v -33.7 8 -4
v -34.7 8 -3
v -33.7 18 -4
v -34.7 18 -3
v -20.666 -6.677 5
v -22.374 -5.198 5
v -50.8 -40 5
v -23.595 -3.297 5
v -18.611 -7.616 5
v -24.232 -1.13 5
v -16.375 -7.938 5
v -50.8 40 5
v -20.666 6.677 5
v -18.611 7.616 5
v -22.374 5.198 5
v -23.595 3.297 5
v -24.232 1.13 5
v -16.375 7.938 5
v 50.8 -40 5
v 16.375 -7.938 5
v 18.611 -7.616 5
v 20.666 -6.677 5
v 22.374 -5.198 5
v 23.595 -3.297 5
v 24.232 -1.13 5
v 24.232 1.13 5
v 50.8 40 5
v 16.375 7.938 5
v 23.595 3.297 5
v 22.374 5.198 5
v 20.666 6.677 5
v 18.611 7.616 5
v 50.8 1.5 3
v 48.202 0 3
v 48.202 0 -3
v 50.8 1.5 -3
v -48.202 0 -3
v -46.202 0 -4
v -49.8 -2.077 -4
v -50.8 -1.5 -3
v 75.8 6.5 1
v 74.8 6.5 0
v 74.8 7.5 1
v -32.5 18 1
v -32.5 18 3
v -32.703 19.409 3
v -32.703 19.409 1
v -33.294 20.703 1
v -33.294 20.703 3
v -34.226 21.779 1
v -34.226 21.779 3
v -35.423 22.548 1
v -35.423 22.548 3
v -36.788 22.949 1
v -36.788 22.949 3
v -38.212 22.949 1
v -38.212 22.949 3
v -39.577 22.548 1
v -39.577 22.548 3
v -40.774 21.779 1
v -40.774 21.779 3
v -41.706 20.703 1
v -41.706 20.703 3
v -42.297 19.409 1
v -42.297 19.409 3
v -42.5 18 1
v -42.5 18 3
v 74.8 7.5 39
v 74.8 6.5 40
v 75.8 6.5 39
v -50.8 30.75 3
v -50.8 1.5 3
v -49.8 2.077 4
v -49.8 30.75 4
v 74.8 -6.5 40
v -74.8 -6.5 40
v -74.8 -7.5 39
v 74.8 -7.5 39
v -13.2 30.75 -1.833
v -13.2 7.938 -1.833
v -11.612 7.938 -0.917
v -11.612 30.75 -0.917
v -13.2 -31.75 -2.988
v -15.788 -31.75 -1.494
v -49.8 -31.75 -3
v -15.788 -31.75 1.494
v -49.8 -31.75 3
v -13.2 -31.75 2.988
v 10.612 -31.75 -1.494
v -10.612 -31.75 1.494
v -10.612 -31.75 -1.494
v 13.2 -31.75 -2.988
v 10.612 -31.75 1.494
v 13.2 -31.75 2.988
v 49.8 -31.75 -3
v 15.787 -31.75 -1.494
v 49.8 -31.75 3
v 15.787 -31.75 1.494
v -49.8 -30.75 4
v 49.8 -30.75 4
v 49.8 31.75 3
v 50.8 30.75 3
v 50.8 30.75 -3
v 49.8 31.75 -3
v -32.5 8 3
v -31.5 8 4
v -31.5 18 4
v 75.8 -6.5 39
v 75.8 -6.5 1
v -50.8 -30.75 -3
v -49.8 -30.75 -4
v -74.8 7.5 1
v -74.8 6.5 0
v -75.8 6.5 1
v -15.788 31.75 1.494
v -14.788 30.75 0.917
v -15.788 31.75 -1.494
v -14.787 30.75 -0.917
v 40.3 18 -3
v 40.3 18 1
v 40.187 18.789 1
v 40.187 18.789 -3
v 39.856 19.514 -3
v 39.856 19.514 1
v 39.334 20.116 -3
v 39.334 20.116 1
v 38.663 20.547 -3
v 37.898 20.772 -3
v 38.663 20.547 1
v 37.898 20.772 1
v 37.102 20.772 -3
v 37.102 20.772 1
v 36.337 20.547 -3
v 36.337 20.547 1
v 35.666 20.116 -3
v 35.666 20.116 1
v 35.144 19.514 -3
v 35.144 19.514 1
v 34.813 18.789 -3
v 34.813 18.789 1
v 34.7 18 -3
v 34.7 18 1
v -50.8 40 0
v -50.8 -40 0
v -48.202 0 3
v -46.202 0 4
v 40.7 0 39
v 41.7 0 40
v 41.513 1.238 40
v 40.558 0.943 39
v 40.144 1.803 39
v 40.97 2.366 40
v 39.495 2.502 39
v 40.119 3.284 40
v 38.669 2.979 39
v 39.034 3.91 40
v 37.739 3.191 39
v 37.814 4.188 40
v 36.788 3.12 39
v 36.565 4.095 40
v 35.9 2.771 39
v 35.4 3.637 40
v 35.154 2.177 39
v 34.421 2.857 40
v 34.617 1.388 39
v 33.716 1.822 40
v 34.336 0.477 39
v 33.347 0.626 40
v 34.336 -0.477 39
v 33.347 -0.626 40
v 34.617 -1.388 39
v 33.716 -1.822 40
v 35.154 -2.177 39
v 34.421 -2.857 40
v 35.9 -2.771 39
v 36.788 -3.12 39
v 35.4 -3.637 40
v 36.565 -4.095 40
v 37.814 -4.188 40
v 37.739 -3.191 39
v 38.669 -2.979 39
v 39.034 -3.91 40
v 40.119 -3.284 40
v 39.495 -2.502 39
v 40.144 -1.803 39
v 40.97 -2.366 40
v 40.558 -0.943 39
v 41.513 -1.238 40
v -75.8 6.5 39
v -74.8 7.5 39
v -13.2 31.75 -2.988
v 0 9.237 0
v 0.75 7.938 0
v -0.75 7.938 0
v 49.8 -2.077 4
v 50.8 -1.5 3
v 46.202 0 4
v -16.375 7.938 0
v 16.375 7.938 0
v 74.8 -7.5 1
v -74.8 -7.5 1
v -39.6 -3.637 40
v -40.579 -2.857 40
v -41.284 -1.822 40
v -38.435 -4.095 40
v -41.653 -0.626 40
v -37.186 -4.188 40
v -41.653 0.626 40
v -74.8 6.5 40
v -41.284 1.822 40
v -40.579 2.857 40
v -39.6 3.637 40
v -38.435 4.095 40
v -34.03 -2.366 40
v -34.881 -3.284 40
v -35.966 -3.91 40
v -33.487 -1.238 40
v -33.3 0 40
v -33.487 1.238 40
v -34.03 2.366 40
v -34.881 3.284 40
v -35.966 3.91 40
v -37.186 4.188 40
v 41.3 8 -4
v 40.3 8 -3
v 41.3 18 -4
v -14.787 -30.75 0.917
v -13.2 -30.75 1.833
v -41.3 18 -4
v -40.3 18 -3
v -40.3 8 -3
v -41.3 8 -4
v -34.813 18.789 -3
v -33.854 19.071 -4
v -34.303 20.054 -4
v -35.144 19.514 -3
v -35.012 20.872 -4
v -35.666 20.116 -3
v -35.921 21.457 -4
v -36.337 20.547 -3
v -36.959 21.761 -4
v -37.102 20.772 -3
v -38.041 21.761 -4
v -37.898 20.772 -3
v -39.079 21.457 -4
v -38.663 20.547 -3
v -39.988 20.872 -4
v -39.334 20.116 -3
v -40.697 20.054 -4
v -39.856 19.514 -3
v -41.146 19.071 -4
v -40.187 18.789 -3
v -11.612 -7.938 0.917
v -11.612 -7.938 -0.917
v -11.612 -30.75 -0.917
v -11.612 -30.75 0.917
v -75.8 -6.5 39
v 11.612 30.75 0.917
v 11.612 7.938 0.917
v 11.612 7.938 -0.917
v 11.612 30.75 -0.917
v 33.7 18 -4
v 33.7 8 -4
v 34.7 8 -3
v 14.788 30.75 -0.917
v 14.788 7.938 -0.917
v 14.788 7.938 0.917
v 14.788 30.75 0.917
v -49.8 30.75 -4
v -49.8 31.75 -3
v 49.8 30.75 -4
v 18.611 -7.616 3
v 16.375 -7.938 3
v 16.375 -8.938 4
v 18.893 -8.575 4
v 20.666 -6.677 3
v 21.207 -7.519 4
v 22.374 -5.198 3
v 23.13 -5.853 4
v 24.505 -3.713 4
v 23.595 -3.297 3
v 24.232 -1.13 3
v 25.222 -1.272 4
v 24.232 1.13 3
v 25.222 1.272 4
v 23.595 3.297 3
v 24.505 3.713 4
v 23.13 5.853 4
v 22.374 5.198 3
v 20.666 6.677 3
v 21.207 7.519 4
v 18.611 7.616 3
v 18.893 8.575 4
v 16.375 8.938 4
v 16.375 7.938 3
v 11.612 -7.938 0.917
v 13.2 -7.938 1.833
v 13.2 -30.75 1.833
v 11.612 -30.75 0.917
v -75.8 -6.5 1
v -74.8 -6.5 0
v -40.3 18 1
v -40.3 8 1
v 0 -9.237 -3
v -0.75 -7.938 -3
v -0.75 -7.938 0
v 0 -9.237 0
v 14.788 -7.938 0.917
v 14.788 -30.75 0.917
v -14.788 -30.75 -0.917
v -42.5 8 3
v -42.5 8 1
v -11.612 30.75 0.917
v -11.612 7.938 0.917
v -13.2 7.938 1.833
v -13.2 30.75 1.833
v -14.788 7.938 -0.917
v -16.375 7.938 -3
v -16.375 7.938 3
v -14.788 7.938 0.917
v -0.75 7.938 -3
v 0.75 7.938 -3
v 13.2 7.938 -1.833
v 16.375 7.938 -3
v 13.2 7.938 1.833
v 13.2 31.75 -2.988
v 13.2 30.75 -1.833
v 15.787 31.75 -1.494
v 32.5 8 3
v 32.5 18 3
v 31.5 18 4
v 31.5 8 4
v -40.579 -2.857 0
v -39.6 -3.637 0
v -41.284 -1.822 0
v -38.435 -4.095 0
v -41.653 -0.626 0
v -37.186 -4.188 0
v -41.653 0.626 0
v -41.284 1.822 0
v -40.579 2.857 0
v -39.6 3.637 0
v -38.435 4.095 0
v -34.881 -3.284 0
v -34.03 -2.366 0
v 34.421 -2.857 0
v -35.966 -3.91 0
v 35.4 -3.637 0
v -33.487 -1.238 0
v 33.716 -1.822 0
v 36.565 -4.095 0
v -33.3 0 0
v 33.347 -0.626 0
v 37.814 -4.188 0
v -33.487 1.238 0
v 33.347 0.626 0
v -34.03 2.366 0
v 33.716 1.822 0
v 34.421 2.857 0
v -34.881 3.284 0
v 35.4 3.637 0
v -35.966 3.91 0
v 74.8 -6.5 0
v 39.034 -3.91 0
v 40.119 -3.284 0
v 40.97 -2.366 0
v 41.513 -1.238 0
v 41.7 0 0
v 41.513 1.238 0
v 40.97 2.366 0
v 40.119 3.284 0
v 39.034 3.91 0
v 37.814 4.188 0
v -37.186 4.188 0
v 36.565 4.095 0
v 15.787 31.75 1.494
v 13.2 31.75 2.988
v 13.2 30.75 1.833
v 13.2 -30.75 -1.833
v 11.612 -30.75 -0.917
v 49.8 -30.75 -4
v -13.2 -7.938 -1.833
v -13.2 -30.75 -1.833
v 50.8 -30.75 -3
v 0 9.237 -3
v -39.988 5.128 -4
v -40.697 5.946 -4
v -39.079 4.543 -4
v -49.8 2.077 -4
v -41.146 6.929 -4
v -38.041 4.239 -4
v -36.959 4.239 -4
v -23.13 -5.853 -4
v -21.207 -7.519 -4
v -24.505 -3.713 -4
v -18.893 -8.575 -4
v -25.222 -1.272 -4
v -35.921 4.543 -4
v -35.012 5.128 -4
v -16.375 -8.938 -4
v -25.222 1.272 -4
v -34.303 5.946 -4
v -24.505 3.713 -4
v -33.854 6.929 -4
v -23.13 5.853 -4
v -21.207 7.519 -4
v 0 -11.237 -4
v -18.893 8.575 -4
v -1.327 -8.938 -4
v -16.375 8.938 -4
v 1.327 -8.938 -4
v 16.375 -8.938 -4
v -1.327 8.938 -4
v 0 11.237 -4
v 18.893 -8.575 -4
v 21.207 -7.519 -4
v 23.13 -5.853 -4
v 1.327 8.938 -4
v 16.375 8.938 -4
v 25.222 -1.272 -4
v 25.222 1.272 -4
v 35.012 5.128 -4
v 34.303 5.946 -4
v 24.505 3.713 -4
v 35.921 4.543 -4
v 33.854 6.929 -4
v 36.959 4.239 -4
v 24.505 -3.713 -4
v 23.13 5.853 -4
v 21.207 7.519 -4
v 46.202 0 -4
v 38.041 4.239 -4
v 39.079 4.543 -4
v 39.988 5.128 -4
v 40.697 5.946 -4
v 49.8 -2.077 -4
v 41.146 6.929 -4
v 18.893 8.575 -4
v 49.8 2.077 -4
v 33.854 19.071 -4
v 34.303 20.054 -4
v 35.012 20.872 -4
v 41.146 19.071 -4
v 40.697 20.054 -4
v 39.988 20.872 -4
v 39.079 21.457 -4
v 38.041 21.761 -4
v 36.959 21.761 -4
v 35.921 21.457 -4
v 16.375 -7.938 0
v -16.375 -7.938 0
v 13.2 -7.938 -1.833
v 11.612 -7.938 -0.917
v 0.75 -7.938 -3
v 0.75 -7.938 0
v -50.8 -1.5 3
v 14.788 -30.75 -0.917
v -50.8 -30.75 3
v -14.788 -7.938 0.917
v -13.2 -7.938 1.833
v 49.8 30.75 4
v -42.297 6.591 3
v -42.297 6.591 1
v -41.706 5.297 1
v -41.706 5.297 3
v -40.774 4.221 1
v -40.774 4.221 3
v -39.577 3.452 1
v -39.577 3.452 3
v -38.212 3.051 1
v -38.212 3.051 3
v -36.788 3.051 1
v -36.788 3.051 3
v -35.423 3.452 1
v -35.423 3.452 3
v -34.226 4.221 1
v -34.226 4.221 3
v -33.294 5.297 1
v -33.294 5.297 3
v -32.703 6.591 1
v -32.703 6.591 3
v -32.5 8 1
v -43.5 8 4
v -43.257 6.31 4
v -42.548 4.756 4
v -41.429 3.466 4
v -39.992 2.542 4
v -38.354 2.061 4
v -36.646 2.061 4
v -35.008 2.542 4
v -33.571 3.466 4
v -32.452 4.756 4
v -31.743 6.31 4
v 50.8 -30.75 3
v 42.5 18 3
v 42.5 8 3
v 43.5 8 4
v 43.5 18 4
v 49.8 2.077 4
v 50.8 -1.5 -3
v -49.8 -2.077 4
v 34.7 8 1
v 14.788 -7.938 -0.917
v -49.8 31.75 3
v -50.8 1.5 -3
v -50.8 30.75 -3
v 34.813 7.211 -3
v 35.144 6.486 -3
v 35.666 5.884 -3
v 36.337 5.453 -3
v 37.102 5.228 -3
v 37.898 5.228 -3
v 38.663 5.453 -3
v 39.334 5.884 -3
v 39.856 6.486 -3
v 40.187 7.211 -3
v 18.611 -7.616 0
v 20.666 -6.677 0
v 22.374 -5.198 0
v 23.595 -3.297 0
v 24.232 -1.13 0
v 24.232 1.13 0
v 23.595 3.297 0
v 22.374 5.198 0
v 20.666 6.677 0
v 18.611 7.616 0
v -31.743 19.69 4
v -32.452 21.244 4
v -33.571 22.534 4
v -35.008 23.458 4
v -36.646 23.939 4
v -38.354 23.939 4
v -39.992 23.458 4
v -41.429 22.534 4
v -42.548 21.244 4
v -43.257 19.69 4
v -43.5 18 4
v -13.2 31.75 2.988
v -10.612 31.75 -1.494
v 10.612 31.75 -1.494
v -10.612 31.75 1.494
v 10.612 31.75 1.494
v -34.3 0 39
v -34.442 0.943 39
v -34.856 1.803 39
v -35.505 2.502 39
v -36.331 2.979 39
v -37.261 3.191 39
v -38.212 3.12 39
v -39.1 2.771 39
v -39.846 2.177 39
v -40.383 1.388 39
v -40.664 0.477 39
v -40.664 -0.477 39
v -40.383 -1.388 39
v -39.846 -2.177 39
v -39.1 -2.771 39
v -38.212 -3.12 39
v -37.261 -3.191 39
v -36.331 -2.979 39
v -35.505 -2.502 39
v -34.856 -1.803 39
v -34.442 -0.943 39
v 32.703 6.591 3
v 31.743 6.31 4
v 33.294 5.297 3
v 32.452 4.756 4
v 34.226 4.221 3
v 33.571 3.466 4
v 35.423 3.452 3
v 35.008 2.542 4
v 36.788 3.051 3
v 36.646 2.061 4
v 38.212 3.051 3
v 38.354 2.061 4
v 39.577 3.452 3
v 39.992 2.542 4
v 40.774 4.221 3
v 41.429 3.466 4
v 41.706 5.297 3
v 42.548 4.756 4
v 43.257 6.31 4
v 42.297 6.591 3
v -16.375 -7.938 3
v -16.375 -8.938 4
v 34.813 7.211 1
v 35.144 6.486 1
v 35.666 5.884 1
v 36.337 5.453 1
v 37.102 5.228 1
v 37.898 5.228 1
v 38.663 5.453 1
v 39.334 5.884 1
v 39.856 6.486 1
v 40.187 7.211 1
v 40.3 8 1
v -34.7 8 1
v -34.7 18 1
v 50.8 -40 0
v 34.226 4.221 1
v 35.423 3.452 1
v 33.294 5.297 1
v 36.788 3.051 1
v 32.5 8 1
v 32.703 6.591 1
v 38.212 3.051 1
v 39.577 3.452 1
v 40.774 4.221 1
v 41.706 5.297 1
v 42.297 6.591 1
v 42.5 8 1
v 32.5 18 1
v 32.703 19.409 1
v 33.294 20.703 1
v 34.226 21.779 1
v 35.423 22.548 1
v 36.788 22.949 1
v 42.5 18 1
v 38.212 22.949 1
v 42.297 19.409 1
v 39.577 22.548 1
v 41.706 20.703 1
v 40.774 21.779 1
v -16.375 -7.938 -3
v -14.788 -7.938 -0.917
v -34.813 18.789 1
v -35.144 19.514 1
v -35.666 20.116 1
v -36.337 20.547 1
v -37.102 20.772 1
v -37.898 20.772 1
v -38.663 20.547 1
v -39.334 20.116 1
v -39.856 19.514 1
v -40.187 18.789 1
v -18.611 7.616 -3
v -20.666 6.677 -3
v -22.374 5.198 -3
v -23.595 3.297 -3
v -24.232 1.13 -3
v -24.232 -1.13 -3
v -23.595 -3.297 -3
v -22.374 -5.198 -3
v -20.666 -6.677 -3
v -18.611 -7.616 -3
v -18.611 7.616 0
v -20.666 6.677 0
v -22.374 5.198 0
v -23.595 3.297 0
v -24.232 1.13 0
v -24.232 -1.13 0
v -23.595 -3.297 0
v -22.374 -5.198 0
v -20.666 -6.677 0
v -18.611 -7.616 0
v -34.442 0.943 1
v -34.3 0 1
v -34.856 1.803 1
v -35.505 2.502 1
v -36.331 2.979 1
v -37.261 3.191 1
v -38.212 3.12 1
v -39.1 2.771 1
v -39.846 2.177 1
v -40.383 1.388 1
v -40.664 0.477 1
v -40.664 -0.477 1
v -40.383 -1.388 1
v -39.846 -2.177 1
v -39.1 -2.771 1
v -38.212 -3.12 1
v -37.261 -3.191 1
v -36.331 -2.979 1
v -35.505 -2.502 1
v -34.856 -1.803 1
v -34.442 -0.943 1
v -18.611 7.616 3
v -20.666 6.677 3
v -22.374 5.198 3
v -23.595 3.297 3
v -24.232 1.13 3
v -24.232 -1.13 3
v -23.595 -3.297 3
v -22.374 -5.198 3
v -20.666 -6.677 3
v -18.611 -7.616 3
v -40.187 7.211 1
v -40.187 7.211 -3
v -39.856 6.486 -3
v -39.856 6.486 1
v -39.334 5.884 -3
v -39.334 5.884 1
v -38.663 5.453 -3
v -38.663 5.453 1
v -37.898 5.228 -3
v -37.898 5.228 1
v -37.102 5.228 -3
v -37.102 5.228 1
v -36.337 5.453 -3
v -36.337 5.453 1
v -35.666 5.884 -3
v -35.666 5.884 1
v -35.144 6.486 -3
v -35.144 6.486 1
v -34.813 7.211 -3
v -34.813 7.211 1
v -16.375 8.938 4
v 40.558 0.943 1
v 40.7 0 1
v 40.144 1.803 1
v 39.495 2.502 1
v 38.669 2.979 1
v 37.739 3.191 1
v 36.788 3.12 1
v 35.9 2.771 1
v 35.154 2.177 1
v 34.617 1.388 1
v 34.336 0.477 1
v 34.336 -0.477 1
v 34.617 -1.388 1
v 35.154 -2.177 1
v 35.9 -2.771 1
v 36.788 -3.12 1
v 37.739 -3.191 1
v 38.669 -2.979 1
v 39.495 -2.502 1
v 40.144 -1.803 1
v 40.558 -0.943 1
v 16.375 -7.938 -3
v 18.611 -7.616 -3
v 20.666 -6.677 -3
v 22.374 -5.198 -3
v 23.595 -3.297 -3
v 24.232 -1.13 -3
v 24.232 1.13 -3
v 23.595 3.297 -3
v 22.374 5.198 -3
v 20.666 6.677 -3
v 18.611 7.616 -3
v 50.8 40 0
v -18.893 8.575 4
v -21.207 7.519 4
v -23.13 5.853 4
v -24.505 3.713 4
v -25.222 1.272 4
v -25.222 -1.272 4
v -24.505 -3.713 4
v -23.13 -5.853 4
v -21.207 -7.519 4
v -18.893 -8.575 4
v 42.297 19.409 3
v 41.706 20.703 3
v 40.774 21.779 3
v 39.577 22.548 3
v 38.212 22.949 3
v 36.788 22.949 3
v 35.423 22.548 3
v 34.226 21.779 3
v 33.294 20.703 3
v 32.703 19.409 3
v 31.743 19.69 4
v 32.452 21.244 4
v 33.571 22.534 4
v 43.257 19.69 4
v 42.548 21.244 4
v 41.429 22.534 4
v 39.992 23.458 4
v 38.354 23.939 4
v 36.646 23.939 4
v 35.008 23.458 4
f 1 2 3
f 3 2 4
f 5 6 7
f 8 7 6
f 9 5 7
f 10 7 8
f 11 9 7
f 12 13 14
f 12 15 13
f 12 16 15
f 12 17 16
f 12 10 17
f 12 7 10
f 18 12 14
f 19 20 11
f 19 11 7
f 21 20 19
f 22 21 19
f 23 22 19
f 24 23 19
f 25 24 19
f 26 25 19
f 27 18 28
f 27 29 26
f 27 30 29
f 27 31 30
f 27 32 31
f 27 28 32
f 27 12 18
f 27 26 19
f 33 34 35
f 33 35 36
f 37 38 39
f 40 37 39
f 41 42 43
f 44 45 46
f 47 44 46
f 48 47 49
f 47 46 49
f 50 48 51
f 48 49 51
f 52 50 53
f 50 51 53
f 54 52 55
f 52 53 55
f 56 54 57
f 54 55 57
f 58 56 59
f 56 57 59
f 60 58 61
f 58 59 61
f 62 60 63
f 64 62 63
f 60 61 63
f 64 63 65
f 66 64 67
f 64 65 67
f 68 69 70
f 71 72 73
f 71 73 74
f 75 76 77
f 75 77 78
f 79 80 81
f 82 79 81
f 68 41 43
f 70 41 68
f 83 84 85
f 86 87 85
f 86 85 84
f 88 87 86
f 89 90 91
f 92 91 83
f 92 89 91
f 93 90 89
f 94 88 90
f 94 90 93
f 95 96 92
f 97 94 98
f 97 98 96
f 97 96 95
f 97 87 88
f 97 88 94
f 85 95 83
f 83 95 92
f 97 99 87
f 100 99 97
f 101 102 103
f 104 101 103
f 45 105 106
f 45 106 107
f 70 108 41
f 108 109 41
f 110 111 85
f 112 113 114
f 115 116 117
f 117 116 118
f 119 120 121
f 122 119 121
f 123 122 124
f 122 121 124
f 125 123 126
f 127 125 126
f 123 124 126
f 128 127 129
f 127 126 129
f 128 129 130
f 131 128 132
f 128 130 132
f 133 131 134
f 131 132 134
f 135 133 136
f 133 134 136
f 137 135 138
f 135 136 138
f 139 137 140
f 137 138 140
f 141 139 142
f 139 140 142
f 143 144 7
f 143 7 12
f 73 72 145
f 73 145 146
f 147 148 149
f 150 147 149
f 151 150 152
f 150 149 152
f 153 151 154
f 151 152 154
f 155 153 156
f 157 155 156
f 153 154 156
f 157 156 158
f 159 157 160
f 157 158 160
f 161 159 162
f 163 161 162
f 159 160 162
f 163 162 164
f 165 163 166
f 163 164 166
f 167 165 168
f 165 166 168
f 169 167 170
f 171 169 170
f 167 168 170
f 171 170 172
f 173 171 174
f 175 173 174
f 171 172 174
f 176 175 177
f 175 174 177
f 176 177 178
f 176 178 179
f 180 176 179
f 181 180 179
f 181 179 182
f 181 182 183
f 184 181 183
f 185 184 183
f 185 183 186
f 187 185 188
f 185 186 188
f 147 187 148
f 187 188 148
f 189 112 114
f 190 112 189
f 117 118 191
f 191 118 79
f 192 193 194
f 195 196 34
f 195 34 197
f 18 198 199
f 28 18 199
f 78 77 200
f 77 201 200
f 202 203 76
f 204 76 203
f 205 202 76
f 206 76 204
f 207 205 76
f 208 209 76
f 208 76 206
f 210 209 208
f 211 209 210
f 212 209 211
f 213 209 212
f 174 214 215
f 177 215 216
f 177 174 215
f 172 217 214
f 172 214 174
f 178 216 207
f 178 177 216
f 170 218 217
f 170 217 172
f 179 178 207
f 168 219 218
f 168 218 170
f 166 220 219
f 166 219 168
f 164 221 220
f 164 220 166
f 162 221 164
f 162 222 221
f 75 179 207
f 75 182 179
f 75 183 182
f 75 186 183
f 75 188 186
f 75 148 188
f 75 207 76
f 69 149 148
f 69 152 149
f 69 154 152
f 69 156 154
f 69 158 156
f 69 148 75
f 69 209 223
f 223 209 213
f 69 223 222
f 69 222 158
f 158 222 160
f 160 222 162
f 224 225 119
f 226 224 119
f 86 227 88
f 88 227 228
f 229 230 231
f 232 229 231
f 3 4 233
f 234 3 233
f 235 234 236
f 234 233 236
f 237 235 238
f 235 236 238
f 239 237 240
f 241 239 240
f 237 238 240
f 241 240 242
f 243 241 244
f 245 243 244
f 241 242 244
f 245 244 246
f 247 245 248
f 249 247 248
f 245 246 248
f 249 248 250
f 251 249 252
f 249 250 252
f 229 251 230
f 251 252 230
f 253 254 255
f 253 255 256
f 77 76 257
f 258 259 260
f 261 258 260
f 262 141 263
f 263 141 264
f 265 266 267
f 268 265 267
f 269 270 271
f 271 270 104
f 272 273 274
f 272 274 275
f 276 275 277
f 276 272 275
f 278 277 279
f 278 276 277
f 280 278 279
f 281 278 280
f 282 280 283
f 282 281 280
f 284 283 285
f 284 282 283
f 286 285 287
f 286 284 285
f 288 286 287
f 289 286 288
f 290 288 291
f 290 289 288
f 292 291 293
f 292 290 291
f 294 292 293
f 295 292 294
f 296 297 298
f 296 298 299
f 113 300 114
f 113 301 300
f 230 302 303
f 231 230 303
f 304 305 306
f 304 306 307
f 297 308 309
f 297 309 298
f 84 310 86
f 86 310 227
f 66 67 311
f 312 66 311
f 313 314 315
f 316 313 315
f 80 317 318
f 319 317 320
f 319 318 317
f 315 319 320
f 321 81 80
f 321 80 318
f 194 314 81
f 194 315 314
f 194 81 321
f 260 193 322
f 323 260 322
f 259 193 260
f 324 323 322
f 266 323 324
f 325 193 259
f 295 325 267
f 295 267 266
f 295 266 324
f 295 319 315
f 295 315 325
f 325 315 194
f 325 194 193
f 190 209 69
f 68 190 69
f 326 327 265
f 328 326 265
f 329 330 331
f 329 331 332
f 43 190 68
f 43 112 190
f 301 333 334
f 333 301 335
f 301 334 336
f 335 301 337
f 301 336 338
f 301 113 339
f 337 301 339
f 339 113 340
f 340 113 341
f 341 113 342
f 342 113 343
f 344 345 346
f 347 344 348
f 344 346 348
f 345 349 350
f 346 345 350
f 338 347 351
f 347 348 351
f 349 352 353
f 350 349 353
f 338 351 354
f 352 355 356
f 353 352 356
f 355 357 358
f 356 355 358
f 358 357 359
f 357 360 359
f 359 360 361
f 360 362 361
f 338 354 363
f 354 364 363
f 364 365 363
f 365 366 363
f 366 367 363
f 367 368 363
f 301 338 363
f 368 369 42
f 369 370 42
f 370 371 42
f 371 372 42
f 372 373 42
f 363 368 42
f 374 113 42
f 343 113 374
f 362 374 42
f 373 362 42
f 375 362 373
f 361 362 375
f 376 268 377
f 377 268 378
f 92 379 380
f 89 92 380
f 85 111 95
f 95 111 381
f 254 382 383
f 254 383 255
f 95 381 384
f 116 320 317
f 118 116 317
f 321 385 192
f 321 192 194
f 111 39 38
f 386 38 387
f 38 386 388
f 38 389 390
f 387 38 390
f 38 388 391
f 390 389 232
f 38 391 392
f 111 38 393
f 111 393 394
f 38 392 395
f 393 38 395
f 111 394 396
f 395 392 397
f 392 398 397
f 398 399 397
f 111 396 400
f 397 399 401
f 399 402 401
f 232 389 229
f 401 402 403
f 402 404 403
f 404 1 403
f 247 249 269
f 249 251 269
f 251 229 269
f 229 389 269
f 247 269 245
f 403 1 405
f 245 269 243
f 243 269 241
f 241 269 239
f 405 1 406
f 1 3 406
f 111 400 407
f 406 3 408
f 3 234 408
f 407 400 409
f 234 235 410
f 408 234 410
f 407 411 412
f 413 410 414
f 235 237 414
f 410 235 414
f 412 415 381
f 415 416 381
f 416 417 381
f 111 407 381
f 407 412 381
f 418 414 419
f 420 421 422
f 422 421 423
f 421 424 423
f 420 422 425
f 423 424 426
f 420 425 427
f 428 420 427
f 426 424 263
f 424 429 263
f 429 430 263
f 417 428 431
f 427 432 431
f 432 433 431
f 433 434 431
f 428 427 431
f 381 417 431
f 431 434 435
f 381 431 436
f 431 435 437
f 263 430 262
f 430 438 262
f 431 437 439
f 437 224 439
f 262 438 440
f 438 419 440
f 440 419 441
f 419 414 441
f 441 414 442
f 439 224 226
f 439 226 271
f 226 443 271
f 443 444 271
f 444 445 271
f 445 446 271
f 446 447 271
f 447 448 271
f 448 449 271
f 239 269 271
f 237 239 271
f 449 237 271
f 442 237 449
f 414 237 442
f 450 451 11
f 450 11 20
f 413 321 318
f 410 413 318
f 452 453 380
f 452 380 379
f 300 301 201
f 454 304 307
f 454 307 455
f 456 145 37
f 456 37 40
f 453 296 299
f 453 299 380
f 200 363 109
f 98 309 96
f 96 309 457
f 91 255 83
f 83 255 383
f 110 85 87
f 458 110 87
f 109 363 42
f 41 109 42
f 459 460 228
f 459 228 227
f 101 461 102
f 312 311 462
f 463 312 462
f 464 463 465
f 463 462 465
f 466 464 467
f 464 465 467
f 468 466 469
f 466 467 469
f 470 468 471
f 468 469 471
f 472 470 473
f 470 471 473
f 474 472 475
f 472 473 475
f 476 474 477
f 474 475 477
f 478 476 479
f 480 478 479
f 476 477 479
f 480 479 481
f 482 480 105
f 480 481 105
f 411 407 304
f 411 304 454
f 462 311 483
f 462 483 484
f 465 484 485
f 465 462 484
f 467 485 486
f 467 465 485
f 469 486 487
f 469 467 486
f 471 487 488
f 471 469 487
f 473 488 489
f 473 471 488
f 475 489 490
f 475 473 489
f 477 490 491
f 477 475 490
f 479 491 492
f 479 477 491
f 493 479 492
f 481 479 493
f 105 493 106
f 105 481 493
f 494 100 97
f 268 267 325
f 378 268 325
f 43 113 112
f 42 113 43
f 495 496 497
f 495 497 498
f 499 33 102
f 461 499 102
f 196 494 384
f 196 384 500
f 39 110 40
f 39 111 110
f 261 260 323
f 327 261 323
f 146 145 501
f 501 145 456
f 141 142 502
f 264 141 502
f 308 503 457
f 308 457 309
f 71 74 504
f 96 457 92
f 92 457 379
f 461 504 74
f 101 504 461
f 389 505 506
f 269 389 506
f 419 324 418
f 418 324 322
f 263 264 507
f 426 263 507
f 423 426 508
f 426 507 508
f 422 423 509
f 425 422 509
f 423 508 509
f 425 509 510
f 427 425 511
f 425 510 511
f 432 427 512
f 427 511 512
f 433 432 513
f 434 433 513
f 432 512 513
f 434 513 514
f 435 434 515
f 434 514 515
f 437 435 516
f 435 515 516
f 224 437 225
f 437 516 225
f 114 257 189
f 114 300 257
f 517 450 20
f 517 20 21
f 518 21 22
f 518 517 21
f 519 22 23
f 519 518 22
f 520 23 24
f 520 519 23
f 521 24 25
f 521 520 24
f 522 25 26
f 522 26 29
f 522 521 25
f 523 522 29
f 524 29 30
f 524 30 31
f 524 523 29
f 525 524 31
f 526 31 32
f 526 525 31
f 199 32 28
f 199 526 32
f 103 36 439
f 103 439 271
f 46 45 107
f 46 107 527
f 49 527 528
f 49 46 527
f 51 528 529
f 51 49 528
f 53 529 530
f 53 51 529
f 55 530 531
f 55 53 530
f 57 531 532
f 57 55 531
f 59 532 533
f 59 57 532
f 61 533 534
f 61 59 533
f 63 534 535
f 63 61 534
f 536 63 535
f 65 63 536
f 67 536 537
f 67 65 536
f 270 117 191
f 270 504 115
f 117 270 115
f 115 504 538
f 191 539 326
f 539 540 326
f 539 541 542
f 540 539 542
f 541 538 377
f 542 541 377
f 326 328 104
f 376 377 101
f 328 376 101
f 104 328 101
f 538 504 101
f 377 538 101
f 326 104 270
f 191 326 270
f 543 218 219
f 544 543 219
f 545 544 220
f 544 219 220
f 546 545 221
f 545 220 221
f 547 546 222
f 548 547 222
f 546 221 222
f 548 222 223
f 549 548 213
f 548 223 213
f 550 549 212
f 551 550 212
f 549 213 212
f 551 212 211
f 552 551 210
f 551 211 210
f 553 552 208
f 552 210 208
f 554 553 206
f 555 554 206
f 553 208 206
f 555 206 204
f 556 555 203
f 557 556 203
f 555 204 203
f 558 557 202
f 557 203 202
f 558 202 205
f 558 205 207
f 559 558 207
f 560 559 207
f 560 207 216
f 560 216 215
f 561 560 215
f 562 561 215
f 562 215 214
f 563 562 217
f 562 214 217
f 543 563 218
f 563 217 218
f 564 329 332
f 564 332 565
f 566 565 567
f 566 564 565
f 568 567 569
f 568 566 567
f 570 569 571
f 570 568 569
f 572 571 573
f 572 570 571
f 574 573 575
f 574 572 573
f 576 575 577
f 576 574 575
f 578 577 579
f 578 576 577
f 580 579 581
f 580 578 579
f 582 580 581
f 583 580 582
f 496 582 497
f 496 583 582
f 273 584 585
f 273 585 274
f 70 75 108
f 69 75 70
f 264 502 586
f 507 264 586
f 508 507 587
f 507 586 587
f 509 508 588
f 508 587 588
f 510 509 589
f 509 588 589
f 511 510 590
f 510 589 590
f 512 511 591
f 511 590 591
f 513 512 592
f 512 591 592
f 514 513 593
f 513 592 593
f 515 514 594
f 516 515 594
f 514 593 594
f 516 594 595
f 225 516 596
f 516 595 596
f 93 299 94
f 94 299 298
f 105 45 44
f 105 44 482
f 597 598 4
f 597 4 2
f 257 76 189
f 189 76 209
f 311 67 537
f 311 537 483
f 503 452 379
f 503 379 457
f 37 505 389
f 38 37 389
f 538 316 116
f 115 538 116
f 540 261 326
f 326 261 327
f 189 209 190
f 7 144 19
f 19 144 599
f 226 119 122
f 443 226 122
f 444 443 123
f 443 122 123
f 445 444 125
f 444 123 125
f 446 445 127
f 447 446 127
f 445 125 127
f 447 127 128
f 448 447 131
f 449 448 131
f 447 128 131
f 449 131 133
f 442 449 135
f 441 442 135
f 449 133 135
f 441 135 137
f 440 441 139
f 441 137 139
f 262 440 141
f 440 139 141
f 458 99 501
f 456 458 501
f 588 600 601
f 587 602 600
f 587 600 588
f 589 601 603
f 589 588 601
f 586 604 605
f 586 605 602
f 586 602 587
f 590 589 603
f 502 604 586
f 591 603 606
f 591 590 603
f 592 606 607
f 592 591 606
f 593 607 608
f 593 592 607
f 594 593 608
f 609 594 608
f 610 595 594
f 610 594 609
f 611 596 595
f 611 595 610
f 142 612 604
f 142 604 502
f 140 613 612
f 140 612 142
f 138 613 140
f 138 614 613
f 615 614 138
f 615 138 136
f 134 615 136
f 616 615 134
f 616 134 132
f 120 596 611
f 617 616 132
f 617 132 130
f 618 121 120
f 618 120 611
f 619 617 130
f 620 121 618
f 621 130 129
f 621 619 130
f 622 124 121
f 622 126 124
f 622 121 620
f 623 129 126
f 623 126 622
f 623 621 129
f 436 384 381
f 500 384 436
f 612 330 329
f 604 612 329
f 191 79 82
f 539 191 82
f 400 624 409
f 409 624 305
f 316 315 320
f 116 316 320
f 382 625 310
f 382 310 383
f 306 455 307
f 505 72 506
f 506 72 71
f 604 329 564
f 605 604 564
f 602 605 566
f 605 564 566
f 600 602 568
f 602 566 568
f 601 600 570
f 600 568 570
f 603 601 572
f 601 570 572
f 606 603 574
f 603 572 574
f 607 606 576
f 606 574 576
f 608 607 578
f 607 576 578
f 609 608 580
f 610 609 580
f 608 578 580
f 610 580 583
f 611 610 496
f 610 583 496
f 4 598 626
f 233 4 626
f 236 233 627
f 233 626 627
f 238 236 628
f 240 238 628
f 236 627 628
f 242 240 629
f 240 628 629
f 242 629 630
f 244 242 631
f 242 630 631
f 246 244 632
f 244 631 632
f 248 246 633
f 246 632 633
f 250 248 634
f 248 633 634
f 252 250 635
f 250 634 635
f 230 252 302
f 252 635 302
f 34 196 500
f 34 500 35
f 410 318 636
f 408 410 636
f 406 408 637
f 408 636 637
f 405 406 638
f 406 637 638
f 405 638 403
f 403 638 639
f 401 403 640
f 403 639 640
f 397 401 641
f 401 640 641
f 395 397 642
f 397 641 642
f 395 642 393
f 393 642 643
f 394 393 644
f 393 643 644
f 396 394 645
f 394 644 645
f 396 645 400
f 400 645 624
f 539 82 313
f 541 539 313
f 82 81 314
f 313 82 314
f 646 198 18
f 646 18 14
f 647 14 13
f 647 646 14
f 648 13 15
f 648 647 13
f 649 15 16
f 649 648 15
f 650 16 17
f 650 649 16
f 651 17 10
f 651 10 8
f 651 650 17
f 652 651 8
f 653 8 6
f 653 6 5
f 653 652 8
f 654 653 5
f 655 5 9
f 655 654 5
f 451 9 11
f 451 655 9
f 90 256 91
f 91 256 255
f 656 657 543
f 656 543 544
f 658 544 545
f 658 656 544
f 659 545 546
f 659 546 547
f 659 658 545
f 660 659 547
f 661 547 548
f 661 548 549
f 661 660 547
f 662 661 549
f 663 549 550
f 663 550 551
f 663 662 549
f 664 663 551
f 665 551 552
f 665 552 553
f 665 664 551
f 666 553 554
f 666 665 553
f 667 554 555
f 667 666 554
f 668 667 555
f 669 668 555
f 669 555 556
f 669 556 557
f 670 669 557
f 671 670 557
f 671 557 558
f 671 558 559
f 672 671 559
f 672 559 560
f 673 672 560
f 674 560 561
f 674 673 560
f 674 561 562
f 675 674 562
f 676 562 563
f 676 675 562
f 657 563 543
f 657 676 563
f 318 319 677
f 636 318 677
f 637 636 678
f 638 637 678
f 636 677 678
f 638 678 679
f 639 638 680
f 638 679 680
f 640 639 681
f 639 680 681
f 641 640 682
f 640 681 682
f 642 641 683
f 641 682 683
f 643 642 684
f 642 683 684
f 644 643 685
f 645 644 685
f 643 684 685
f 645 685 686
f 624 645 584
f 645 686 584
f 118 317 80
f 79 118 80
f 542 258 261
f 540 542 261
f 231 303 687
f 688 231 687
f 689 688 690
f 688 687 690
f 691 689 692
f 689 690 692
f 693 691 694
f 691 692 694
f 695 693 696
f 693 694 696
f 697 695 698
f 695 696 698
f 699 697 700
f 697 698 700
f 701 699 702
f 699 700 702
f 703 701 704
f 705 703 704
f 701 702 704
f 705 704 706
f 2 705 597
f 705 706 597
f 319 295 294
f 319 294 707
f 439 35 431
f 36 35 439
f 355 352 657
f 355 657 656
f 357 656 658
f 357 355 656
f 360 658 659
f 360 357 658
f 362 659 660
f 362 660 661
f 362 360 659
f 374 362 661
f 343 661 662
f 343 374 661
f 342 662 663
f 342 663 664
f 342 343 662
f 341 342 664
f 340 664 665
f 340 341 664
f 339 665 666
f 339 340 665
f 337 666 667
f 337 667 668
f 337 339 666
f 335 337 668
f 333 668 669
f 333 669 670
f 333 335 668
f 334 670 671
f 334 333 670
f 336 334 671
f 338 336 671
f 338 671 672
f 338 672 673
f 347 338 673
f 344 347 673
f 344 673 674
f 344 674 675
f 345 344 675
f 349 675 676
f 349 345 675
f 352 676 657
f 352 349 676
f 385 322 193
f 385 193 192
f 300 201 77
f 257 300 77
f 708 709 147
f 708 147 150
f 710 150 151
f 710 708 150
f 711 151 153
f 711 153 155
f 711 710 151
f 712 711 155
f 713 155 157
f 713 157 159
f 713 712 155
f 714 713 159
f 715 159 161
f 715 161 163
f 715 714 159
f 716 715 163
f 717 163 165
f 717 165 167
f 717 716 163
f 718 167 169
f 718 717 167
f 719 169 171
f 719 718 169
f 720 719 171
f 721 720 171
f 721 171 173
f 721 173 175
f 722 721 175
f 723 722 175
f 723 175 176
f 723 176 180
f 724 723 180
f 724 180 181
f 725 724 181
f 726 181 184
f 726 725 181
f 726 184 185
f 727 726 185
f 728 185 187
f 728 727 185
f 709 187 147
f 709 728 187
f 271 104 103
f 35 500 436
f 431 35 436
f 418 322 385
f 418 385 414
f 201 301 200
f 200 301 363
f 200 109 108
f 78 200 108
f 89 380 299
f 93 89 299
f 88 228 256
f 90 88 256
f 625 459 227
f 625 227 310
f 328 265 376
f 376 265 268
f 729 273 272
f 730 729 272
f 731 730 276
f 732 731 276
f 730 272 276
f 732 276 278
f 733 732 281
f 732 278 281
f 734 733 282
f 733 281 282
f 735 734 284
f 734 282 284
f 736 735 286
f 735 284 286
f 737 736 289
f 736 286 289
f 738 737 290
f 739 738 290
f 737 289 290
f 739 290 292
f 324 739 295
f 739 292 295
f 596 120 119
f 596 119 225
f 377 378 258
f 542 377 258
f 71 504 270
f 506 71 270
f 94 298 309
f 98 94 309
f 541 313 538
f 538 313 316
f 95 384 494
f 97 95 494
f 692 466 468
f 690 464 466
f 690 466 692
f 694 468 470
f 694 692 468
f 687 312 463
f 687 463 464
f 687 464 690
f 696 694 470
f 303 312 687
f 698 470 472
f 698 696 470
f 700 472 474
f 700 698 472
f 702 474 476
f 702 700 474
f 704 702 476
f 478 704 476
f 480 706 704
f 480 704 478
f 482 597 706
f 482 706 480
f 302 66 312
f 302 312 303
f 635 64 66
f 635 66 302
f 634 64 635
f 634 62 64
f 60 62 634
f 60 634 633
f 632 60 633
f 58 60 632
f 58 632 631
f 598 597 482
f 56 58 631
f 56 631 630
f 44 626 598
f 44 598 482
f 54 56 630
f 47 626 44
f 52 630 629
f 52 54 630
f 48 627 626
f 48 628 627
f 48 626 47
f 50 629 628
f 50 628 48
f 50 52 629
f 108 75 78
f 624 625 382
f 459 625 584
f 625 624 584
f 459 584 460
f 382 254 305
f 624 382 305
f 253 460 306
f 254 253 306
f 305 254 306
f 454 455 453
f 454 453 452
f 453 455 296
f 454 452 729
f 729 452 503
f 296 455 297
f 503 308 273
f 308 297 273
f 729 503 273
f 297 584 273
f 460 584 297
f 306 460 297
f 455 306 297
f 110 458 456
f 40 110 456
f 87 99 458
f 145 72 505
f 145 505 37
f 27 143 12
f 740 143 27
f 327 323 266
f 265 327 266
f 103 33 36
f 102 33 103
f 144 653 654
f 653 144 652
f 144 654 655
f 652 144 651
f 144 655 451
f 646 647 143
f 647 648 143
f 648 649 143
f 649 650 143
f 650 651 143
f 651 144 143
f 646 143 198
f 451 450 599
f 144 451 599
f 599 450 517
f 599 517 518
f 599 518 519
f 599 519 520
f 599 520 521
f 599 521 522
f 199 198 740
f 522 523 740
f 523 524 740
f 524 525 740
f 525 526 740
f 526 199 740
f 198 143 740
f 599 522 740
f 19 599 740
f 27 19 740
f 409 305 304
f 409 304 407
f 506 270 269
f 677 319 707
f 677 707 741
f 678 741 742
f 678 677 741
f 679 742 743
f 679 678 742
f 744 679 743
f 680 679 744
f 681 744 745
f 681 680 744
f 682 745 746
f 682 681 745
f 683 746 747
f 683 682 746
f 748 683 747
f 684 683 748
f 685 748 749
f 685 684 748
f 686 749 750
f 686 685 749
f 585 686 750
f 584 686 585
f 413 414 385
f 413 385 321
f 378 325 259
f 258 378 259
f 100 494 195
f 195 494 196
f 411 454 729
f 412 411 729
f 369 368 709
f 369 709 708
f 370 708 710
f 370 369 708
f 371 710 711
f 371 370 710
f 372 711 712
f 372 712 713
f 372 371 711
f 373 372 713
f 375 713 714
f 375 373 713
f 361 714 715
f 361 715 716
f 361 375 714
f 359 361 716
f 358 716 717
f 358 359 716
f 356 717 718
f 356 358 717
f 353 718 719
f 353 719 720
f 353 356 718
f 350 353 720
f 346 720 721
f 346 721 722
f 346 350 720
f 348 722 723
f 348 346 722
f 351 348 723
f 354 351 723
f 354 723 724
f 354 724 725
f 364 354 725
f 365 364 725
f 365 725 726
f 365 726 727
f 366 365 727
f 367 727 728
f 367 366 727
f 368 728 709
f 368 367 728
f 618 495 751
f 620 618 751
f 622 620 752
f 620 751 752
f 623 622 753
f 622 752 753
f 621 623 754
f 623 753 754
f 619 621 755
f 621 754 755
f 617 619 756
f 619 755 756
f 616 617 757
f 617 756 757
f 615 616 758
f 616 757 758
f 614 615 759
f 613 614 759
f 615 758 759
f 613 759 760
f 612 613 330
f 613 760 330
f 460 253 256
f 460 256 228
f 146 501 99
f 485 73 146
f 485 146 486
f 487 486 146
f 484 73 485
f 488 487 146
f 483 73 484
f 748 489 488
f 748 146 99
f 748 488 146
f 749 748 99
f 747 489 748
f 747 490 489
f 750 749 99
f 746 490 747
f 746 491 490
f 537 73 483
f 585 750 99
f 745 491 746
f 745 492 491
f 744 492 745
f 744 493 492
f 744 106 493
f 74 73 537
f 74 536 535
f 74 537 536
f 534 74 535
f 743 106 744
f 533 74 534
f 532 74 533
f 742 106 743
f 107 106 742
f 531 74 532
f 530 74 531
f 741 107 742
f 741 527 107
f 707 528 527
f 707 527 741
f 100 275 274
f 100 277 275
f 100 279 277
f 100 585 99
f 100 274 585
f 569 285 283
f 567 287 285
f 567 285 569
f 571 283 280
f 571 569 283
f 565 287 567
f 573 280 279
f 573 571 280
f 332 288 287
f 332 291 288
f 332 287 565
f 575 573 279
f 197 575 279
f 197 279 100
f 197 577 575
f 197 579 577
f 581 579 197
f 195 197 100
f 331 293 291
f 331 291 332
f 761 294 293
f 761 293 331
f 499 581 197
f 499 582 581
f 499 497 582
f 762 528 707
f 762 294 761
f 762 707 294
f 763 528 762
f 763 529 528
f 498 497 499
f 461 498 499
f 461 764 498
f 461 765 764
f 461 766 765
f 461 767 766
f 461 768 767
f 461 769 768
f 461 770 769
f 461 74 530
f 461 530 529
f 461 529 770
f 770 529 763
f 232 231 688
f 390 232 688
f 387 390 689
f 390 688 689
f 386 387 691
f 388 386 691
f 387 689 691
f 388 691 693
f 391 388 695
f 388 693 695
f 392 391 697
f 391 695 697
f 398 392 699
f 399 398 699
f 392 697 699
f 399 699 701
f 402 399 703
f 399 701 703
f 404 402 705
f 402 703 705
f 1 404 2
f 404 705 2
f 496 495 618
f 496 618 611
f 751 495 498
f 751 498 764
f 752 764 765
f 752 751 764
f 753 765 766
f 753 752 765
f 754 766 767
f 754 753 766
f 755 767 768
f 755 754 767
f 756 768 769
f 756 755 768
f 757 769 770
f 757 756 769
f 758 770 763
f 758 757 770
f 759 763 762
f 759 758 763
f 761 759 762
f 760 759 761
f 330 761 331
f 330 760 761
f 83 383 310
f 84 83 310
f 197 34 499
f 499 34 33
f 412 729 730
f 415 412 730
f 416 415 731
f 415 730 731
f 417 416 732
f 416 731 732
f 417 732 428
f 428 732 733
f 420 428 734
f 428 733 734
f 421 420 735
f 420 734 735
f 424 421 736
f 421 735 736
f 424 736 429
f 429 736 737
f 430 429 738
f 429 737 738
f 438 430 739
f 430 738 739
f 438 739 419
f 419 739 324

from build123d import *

# Parameters (mm, degrees)
SKETCH002_W          = 101.6
SKETCH002_H          = 80
PAD_DEPTH            = 5
SKETCH005_W          = 101.6
SKETCH005_H          = 63.5
PAD001_DEPTH         = 4
POCKET_DEPTH         = 31.751
POCKET_DEPTH_BACK    = -31.751
POCKET001_DEPTH      = 4.001
POCKET001_DEPTH_BACK = -4.001
POCKET002_DEPTH      = 3
POCKET003_DEPTH      = 8.001
POCKET004_DEPTH      = 4
CHAMFER003_SIZE      = 1
SKETCH009_W          = 151.6
SKETCH009_H          = 15
SKETCH009_R          = 3.2
PAD002_DEPTH         = 40
CHAMFER002_SIZE      = 1


with BuildPart() as test:
    # Sketch002 → Pad (new body)
    with BuildSketch(Plane.XY):
        Rectangle(SKETCH002_W, SKETCH002_H)
        with BuildLine():
            ThreePointArc((-16.375, 7.9375), (-24.3125, 0), (-16.375, -7.9375))
            Line((-16.375, -7.9375), (16.375, -7.9375))
            ThreePointArc((16.375, -7.9375), (24.3125, 0), (16.375, 7.9375))
            Line((-16.375, 7.9375), (16.375, 7.9375))
        make_face(mode=Mode.SUBTRACT)
    extrude(amount=PAD_DEPTH)


with BuildPart() as plate:
    # Sketch005 → Pad001 (new body, symmetric)
    with BuildSketch(Plane.XY):
        Rectangle(SKETCH005_W, SKETCH005_H)
        with BuildLine():
            ThreePointArc((-16.375, 7.9375), (-24.3125, 0), (-16.375, -7.9375))
            Line((-16.375, -7.9375), (16.375, -7.9375))
            ThreePointArc((16.375, -7.9375), (24.3125, 0), (16.375, 7.9375))
            Line((-16.375, 7.9375), (16.375, 7.9375))
        make_face(mode=Mode.SUBTRACT)
    extrude(amount=PAD001_DEPTH, both=True)

    # Sketch006 → Pocket (cut, two sides)
    with BuildSketch(Plane.XZ) as pocket_sk:
        Polygon((-11.6125, -0.916544), (-11.6125, 0.916544), (-13.2, 1.833087), (-14.7875, 0.916544), (-14.7875, -0.916544), (-13.2, -1.833087), align=None)
        Polygon((13.2, -1.833087), (14.7875, -0.916544), (14.7875, 0.916544), (13.2, 1.833087), (11.6125, 0.916544), (11.6125, -0.916544), align=None)
    extrude(amount=-POCKET_DEPTH, mode=Mode.SUBTRACT)
    extrude(pocket_sk.sketch, amount=-POCKET_DEPTH_BACK, mode=Mode.SUBTRACT)

    # Sketch007 → Pocket001 (cut, two sides)
    with BuildSketch(Plane.XY) as pocket001_sk:
        with BuildLine():
            ThreePointArc((-34.7, 18), (-37.5, 20.8), (-40.3, 18))
            Line((-40.3, 18), (-40.3, 8))
            ThreePointArc((-40.3, 8), (-37.5, 5.2), (-34.7, 8))
            Line((-34.7, 18), (-34.7, 8))
        make_face()
        with BuildLine():
            ThreePointArc((40.3, 18), (37.5, 20.8), (34.7, 18))
            Line((34.7, 18), (34.7, 8))
            ThreePointArc((34.7, 8), (37.5, 5.2), (40.3, 8))
            Line((40.3, 18), (40.3, 8))
        make_face()
    extrude(amount=-POCKET001_DEPTH, mode=Mode.SUBTRACT)
    extrude(pocket001_sk.sketch, amount=-POCKET001_DEPTH_BACK, mode=Mode.SUBTRACT)

    # Sketch008 (on Face5 of Pocket001) → Pocket002 (cut)
    with BuildSketch(Plane.XY.offset(4)):
        with BuildLine():
            ThreePointArc((42.5, 18), (37.5, 23), (32.5, 18))
            Line((32.5, 18), (32.5, 8))
            ThreePointArc((32.5, 8), (37.5, 3), (42.5, 8))
            Line((42.5, 18), (42.5, 8))
        make_face()
        with BuildLine():
            ThreePointArc((-32.5, 18), (-37.5, 23), (-42.5, 18))
            Line((-42.5, 18), (-42.5, 8))
            ThreePointArc((-42.5, 8), (-37.5, 3), (-32.5, 8))
            Line((-32.5, 18), (-32.5, 8))
        make_face()
    extrude(amount=-POCKET002_DEPTH, mode=Mode.SUBTRACT)

    # Sketch010 (on Face5 of Pocket002) → Pocket003 (cut, through all)
    with BuildSketch(Plane.XY.offset(4)):
        Polygon((-50.8, 1.5), (-48.201924, 0), (-50.8, -1.5), align=None)
        Polygon((48.201924, 0), (50.8, 1.5), (50.8, -1.5), align=None)
    extrude(amount=-POCKET003_DEPTH, mode=Mode.SUBTRACT)

    # Sketch011 (on Face2 of Pocket003) → Pocket004 (cut)
    with BuildSketch(Plane(origin=(0, 0, -4), x_dir=(1, 0, 0), z_dir=(0, 0, -1))):
        Polygon((-0.75, 7.9375), (0, 9.236538), (0.75, 7.9375), align=None)
        Polygon((-0.75, -7.9375), (0.75, -7.9375), (0, -9.236538), align=None)
    extrude(amount=-POCKET004_DEPTH, mode=Mode.SUBTRACT)

    # Chamfer003
    chamfer003_edges = [plate.edges().sort_by_distance(p)[0] for p in [
        (0, 31.75, 4),
        (50.8, 16.625, 4),
        (49.500962, 0.75, 4),
        (49.500962, -0.75, 4),
        (50.8, -16.625, 4),
        (0, -31.75, 4),
        (-50.8, -16.625, 4),
        (-49.500962, -0.75, 4),
        (-49.500962, 0.75, 4),
        (-50.8, 16.625, 4),
        (-24.3125, 0, 4),
        (0, 7.9375, 4),
        (0, -7.9375, 4),
        (24.3125, 0, 4),
        (-37.5, 23, 4),
        (-32.5, 13, 4),
        (-42.5, 13, 4),
        (-37.5, 3, 4),
        (37.5, 23, 4),
        (42.5, 13, 4),
        (32.5, 13, 4),
        (37.5, 3, 4),
        (50.8, 31.75, 0),
        (0, 31.75, -4),
        (-50.8, 31.75, 0),
        (13.99375, 31.75, -1.374815),
        (14.7875, 31.75, 0),
        (13.99375, 31.75, 1.374815),
        (12.40625, 31.75, 1.374815),
        (11.6125, 31.75, 0),
        (12.40625, 31.75, -1.374815),
        (-11.6125, 31.75, 0),
        (-12.40625, 31.75, 1.374815),
        (-13.99375, 31.75, 1.374815),
        (-14.7875, 31.75, 0),
        (-13.99375, 31.75, -1.374815),
        (-12.40625, 31.75, -1.374815),
        (50.8, 16.625, -4),
        (-50.8, 16.625, -4),
        (49.500962, 0.75, -4),
        (-49.500962, 0.75, -4),
        (49.500962, -0.75, -4),
        (-49.500962, -0.75, -4),
        (50.8, -16.625, -4),
        (-50.8, -16.625, -4),
        (0, -31.75, -4),
        (-24.3125, 0, -4),
        (-8.5625, -7.9375, -4),
        (-0.375, -8.587019, -4),
        (0.375, -8.587019, -4),
        (8.5625, -7.9375, -4),
        (24.3125, 0, -4),
        (8.5625, 7.9375, -4),
        (0.375, 8.587019, -4),
        (-0.375, 8.587019, -4),
        (-8.5625, 7.9375, -4),
        (-37.5, 20.8, -4),
        (-34.7, 13, -4),
        (-40.3, 13, -4),
        (-37.5, 5.2, -4),
        (37.5, 20.8, -4),
        (40.3, 13, -4),
        (34.7, 13, -4),
        (37.5, 5.2, -4),
        (-50.8, -31.75, 0),
        (50.8, -31.75, 0),
        (-11.6125, -31.75, 0),
        (-12.40625, -31.75, -1.374815),
        (-13.99375, -31.75, -1.374815),
        (-14.7875, -31.75, 0),
        (-13.99375, -31.75, 1.374815),
        (-12.40625, -31.75, 1.374815),
        (13.99375, -31.75, -1.374815),
        (12.40625, -31.75, -1.374815),
        (11.6125, -31.75, 0),
        (12.40625, -31.75, 1.374815),
        (13.99375, -31.75, 1.374815),
        (14.7875, -31.75, 0),
    ]]
    chamfer(chamfer003_edges, length=CHAMFER003_SIZE)


with BuildPart() as fence:
    # Sketch009 → Pad002 (new body)
    with BuildSketch(Plane.XY):
        Rectangle(SKETCH009_W, SKETCH009_H)
        with Locations((-37.5, 0)):
            Circle(SKETCH009_R, mode=Mode.SUBTRACT)
        with Locations((37.5, 0)):
            Circle(SKETCH009_R, mode=Mode.SUBTRACT)
    extrude(amount=PAD002_DEPTH)

    # Chamfer002
    chamfer002_edges = [fence.edges().sort_by_distance(p)[0] for p in [
        (-75.8, 0, 40),
        (0, -7.5, 40),
        (75.8, 0, 40),
        (0, 7.5, 40),
        (34.3, 0, 40),
        (-40.7, 0, 40),
        (-75.8, 0, 0),
        (0, -7.5, 0),
        (75.8, 0, 0),
        (0, 7.5, 0),
        (34.3, 0, 0),
        (-40.7, 0, 0),
        (-75.8, 7.5, 20),
        (-75.8, -7.5, 20),
        (75.8, -7.5, 20),
        (75.8, 7.5, 20),
    ]]
    chamfer(chamfer002_edges, length=CHAMFER002_SIZE)


solid = Compound([test.part, plate.part, fence.part])
